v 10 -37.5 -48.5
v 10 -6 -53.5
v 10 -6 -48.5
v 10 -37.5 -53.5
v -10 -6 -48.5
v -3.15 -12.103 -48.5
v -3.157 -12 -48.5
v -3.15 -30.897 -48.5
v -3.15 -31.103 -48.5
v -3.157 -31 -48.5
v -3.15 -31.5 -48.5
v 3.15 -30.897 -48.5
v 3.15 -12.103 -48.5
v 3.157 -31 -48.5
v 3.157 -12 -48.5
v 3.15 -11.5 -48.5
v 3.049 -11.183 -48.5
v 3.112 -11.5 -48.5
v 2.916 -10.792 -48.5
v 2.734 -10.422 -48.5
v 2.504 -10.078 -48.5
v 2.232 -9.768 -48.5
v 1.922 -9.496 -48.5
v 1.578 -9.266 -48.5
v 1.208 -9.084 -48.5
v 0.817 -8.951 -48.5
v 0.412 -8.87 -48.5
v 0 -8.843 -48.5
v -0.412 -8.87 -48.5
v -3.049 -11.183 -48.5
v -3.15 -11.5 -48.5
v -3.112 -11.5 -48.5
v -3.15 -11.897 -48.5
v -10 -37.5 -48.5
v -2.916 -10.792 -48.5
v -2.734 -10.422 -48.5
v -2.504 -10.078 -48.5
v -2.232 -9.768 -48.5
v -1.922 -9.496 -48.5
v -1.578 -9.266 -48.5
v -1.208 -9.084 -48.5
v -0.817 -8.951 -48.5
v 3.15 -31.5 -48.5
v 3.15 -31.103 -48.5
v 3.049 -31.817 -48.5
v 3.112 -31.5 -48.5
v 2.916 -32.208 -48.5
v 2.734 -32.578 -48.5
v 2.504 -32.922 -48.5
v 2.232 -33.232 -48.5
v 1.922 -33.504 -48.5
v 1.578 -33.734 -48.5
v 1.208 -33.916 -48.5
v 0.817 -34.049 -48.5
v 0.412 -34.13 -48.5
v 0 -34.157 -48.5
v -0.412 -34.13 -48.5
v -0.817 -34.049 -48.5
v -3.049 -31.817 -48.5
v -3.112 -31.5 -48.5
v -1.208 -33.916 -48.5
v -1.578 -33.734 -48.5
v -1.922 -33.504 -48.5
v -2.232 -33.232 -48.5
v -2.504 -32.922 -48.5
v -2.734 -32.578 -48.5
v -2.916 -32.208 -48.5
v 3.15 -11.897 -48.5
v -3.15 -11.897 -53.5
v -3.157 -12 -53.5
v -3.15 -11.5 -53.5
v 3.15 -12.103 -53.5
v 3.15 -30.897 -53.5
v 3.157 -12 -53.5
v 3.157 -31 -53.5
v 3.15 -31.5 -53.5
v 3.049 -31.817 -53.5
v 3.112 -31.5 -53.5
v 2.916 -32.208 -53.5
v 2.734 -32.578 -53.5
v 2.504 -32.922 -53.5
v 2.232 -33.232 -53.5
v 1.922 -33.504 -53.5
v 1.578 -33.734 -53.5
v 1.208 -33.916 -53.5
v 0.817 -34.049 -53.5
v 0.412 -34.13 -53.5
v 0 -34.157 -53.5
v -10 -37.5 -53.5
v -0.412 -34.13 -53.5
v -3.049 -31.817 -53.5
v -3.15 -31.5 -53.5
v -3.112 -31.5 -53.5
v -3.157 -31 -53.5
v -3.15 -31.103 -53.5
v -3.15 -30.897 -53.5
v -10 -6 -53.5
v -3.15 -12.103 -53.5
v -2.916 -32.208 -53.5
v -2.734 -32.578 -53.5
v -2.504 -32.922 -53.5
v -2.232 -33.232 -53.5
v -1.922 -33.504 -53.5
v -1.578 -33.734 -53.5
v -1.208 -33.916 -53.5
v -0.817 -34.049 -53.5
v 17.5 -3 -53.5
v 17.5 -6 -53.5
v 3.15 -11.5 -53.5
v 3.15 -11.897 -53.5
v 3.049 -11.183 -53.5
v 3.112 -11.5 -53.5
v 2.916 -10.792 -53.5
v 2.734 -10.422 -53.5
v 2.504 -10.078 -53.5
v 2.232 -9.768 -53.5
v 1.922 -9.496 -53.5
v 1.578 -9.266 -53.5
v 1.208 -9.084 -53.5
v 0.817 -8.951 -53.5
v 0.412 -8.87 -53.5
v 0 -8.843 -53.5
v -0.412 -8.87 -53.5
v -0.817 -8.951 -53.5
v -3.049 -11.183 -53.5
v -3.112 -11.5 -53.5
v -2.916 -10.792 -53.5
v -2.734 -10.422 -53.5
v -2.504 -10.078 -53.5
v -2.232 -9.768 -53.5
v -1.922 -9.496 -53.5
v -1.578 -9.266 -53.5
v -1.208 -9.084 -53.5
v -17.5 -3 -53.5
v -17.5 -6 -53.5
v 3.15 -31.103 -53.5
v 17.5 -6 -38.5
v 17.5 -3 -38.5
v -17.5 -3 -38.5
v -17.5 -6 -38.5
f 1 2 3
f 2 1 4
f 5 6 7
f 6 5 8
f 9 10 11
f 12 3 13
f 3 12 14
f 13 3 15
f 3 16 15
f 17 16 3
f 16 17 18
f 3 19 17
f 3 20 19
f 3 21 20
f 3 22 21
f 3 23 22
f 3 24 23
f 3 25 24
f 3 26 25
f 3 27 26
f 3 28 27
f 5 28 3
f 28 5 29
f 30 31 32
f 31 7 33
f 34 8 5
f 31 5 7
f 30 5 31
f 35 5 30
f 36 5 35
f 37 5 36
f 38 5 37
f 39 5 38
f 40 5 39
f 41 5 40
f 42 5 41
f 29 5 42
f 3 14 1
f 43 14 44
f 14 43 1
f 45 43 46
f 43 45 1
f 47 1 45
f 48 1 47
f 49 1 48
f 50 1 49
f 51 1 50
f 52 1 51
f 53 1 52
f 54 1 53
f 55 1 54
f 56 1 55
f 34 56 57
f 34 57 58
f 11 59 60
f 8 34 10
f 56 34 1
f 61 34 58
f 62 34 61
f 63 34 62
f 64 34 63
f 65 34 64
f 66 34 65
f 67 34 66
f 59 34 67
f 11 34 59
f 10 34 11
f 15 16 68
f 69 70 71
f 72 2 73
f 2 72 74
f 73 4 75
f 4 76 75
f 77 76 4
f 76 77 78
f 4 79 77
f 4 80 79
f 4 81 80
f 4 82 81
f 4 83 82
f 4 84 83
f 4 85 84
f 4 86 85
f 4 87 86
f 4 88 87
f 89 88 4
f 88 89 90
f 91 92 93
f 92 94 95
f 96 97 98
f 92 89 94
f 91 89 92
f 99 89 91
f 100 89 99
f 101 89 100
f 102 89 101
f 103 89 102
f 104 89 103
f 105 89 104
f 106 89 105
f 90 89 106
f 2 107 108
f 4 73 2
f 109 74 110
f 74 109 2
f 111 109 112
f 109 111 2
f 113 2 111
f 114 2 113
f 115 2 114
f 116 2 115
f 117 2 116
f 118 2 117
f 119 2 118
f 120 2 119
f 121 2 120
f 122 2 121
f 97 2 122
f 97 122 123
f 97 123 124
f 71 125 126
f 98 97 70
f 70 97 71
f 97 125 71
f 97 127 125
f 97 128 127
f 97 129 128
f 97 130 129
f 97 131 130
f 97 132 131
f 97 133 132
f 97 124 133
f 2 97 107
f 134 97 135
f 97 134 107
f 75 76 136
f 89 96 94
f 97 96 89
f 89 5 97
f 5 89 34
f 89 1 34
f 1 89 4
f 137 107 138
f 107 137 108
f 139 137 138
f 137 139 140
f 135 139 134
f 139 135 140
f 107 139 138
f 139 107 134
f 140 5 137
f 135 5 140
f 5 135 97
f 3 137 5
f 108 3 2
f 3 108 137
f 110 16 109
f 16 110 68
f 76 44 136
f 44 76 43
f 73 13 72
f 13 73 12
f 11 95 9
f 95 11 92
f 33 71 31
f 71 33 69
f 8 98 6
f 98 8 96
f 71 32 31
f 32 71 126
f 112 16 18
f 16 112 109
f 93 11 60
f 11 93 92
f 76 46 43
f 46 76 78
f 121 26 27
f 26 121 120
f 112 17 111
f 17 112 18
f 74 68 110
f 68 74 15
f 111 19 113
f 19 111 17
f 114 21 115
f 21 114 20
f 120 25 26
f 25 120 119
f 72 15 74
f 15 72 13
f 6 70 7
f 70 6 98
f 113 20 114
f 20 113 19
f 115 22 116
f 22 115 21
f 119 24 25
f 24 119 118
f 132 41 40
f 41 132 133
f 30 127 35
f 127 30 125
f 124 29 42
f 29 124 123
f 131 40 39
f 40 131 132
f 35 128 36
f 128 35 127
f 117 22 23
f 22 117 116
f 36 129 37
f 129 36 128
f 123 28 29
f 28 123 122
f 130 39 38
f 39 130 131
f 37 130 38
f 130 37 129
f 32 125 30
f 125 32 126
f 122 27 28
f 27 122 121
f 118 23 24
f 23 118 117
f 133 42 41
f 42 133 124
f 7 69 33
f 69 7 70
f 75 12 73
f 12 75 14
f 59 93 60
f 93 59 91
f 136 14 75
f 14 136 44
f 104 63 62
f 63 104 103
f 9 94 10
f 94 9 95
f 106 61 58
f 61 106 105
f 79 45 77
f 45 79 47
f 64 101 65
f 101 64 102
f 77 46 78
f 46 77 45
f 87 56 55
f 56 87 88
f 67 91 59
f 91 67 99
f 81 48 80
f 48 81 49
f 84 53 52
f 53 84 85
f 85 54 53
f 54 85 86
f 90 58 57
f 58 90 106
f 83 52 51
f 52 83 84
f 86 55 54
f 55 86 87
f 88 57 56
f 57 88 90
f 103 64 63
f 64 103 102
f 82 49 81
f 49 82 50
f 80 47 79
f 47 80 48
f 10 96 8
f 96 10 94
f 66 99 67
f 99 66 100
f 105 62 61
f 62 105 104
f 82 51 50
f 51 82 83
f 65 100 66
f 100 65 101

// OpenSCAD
// file: Generic Mount Disc.scad
use <cylinder_outer.scad>

// Globals (in mm)
function GenericMountDisc_Diameter() = 112.5;
function GenericMountDisc_Thickness() = 12.5;
function GenericMountDisc_NotchZ() = 6.025;
function GenericMountDisc_NotchDiameter() = 6.8;
function GenericMountDisc_NotchDepth() = 5.75;

module GenericMountDisc(pos = [0,0,0]) {
// Parameters (in mm)
errorMargin=0.07;
baseDiam = GenericMountDisc_Diameter();
baseRadius = baseDiam / 2;
baseThickness = GenericMountDisc_Thickness();
holeCenter = GenericMountDisc_NotchZ();
holeDiam = GenericMountDisc_NotchDiameter();
holeRadius = holeDiam / 2;
holeDepth = GenericMountDisc_NotchDepth();
boxHeight = 7;
boxWidth = 13.5;

// Offset to position
translate(pos) {

    // Base
    difference() {
    cylinder_outer(h=baseThickness, r=baseRadius, fn=128);

    // Bolt holes
    translate([0, 0, holeCenter]) {
        offset = baseRadius - holeDepth/2 + errorMargin;
        translate([0, offset, 0]) rotate([90,0,0]) cylinder_outer(h=holeDepth, r=holeRadius, center=true);
        translate([0, -offset, 0]) rotate([-90,0,0]) cylinder_outer(h=holeDepth, r=holeRadius, center=true);
    }

    // Box
    offset = boxWidth / 2;
    translate([-offset, -offset, -errorMargin]) cube([boxWidth, boxWidth, boxHeight + errorMargin]);
    }
    }
}

GenericMountDisc();
// file: Generic Mount Ring.scad
depth = 1.76;
rad_lg = 22.45;
rad_sm = 13.5/2 - 1;

module GenericMountRing() {
    translate([0,0,-1.5]) difference() {
        import("../Models/Generic Mount Ring.stl");
        translate([0,0,-1.1]) scale([1,1, depth/rad_lg]) sphere(rad_lg, $fn=64);
        translate([0,0,.725]) scale([1,1, 1/rad_sm]) sphere(rad_sm, $fn=64);
    }
}

GenericMountRing();

         
// file: cylinder_outer.scad
 module cylinder_outer(h, d=1, r, center=false, fn=48){
   rad = !is_undef(r) ? r : d/2;
   fudge = 1/cos(180/fn);
   cylinder(h=h,r=rad*fudge,center=center,$fn=fn);
}
// file: Diamond Interface Plate.scad
use <cylinder_outer.scad>
use <Generic Mount Ring.scad>
use <Generic Mount Disc.scad>

plateW = 300;
plateD = 12.7;

holeDist = 25;
holeDiam = 6.5;
recessDiam = 15;
recessDepth = 6;
cols = 11;
rows = 11;

function DiamondPlateWidth() = plateW;
function DiamondPlateDepth() = plateD;

module DiamondInterfaceHoles(rangeX = [1, cols], rangeY = [1, rows], recess = false, circular = false) {
    for(y = [rangeY[0] : rangeY[1]]) {
        for(x = [rangeX[0] : rangeX[1]]) {
            if(circular) {
                x2 = abs(x - 12/2);
                y2 = abs(y - 12/2);
                if(x2 + y2 <= 14/2) {
                    translate([x*holeDist, y*holeDist, -.5]) cylinder_outer(h = plateD + 1, d=holeDiam);
                    if(recess) {
                        translate([x*holeDist, y*holeDist, recessDepth]) cylinder_outer(h = recessDepth+15, d=recessDiam);
                    }
                }
            } else {    
                translate([x*holeDist, y*holeDist, -.5]) cylinder_outer(h = plateD + 1, d=holeDiam);
                if(recess) {
                    translate([x*holeDist, y*holeDist, recessDepth]) cylinder_outer(h = recessDepth+15, d=recessDiam);
                }
            }
            
        }
    }
}

module DiamondInterfacePlate() {
    translate([-plateW/2, -plateW/2, -plateD])
    difference() {
        cube([plateW, plateW, plateD]);
        DiamondInterfaceHoles();
    }
}

module DiamondInterfacePlateCircular() {
    difference() {
        translate([0,0,-plateD]) cylinder_outer(h=plateD, d=400);
        translate([-plateW/2, -plateW/2, -plateD]) DiamondInterfaceHoles(circular=true);
    }
}

module DiamondMountRing() {
    h=11;
    difference() {
    union() {
        translate([0,0 , -h]) cylinder_outer(h = h, d = 175);
        GenericMountRing();
    }
    
    
    translate([-plateW/2, -plateW/2, -plateD]) {
        DiamondInterfaceHoles(rangeX=[3,3], rangeY=[5,7]);
        DiamondInterfaceHoles(rangeX=[9,9], rangeY=[5,7]);
        DiamondInterfaceHoles(rangeX=[4,4], rangeY=[4,8]);
        DiamondInterfaceHoles(rangeX=[8,8], rangeY=[4,8]);
        DiamondInterfaceHoles(rangeX=[5,7], rangeY=[3,3]);
        DiamondInterfaceHoles(rangeX=[5,7], rangeY=[9,9]);
    
        // recessed for bolts
        DiamondInterfaceHoles(rangeX=[3,3], rangeY=[6,6], recess=true);
        DiamondInterfaceHoles(rangeX=[4,4], rangeY=[4,4], recess=true);
        DiamondInterfaceHoles(rangeX=[4,4], rangeY=[8,8], recess=true);
        DiamondInterfaceHoles(rangeX=[8,8], rangeY=[4,4], recess=true);
        DiamondInterfaceHoles(rangeX=[8,8], rangeY=[8,8], recess=true);
        DiamondInterfaceHoles(rangeX=[9,9], rangeY=[6,6], recess=true);
    }
    }
}

translate([0,0,-GenericMountDisc_Thickness()]) DiamondMountRing();
// main file
use <Diamond Interface Plate.scad>;
use <cylinder_outer.scad>

// fr34
paperWidth = 73;
paperHeight = 82;
objWidth = 16;
objHeight = 23;
label = "Paris1, fr34";


/*
// fr39
paperWidth = 75;
paperHeight = 85;
objWidth = 16;
objHeight = 29;
label = "Paris1, fr39";
*/


/*
// fr47
paperWidth = 65;
paperHeight = 85;
objWidth = 18;
objHeight = 23;
label = "Paris2, fr47";
*/

/*
// fr143
paperWidth = 105;
paperHeight = 132;
objWidth = 30;
objHeight = 45;
label = "Paris2, fr143";
*/


layerThickness = 3;
buffer = 12.5;
backerHeight = paperHeight + 25;
showObject = false;

module object() {
    cube([paperWidth, .1, paperHeight], center=true);
    translate([0,.1,0]) cube([ objWidth, 1, objHeight], center = true);
}

module backer() {
    difference() {
        translate([0,-layerThickness/2,0]) cube([paperWidth-2*buffer, layerThickness, backerHeight], center = true);
        translate([(paperWidth-2*buffer)/2 - 1.5, -0.5, -paperHeight/2 - 2]) rotate([90,0,180]) linear_extrude(height=1) text(label, size=3, font="Arial Rounded MT Bold");
    }
}

module frame() {
    translate([0,0,0]) {
        difference() {
            cube([paperWidth-2*buffer, layerThickness, paperHeight+10], center = true);
            cube([paperWidth-2*buffer-10, layerThickness, paperHeight-10], center = true);
            translate([(paperWidth-2*buffer)/2 - 1.5,layerThickness/2 - 0.5, -paperHeight/2 - 1]) rotate([90,0,180]) linear_extrude(height=1) text(label, size=3, font="Arial Rounded MT Bold");
        }
    }
}

module stand() {
    difference() {
        union() {
            translate([0,-75/4,-backerHeight/2 + 2.5]) cube([20, 75/2, 5], center = true);
            translate([-35/2,-2*layerThickness,-backerHeight/2]) cube([35, layerThickness, 15]);
        }
        backer();
        translate([0,-27.5+12/2,-backerHeight/2-0.1]) cube([6.3, 20, DiamondPlateDepth() + 1], center=true);
        translate([0,-12,-backerHeight/2-0.1]) cylinder_outer(h=DiamondPlateDepth() + 1, d=6.3);
        translate([0,-31,-backerHeight/2-0.1]) cylinder_outer(h=DiamondPlateDepth() + 1, d=6.3);
    }    
}

/*
backer();
translate([0,0,(backerHeight - paperHeight - 10)/2]) {
    if(showObject) object();
    translate([0,layerThickness/2 + 1,0]) frame();
}*/

stand();
